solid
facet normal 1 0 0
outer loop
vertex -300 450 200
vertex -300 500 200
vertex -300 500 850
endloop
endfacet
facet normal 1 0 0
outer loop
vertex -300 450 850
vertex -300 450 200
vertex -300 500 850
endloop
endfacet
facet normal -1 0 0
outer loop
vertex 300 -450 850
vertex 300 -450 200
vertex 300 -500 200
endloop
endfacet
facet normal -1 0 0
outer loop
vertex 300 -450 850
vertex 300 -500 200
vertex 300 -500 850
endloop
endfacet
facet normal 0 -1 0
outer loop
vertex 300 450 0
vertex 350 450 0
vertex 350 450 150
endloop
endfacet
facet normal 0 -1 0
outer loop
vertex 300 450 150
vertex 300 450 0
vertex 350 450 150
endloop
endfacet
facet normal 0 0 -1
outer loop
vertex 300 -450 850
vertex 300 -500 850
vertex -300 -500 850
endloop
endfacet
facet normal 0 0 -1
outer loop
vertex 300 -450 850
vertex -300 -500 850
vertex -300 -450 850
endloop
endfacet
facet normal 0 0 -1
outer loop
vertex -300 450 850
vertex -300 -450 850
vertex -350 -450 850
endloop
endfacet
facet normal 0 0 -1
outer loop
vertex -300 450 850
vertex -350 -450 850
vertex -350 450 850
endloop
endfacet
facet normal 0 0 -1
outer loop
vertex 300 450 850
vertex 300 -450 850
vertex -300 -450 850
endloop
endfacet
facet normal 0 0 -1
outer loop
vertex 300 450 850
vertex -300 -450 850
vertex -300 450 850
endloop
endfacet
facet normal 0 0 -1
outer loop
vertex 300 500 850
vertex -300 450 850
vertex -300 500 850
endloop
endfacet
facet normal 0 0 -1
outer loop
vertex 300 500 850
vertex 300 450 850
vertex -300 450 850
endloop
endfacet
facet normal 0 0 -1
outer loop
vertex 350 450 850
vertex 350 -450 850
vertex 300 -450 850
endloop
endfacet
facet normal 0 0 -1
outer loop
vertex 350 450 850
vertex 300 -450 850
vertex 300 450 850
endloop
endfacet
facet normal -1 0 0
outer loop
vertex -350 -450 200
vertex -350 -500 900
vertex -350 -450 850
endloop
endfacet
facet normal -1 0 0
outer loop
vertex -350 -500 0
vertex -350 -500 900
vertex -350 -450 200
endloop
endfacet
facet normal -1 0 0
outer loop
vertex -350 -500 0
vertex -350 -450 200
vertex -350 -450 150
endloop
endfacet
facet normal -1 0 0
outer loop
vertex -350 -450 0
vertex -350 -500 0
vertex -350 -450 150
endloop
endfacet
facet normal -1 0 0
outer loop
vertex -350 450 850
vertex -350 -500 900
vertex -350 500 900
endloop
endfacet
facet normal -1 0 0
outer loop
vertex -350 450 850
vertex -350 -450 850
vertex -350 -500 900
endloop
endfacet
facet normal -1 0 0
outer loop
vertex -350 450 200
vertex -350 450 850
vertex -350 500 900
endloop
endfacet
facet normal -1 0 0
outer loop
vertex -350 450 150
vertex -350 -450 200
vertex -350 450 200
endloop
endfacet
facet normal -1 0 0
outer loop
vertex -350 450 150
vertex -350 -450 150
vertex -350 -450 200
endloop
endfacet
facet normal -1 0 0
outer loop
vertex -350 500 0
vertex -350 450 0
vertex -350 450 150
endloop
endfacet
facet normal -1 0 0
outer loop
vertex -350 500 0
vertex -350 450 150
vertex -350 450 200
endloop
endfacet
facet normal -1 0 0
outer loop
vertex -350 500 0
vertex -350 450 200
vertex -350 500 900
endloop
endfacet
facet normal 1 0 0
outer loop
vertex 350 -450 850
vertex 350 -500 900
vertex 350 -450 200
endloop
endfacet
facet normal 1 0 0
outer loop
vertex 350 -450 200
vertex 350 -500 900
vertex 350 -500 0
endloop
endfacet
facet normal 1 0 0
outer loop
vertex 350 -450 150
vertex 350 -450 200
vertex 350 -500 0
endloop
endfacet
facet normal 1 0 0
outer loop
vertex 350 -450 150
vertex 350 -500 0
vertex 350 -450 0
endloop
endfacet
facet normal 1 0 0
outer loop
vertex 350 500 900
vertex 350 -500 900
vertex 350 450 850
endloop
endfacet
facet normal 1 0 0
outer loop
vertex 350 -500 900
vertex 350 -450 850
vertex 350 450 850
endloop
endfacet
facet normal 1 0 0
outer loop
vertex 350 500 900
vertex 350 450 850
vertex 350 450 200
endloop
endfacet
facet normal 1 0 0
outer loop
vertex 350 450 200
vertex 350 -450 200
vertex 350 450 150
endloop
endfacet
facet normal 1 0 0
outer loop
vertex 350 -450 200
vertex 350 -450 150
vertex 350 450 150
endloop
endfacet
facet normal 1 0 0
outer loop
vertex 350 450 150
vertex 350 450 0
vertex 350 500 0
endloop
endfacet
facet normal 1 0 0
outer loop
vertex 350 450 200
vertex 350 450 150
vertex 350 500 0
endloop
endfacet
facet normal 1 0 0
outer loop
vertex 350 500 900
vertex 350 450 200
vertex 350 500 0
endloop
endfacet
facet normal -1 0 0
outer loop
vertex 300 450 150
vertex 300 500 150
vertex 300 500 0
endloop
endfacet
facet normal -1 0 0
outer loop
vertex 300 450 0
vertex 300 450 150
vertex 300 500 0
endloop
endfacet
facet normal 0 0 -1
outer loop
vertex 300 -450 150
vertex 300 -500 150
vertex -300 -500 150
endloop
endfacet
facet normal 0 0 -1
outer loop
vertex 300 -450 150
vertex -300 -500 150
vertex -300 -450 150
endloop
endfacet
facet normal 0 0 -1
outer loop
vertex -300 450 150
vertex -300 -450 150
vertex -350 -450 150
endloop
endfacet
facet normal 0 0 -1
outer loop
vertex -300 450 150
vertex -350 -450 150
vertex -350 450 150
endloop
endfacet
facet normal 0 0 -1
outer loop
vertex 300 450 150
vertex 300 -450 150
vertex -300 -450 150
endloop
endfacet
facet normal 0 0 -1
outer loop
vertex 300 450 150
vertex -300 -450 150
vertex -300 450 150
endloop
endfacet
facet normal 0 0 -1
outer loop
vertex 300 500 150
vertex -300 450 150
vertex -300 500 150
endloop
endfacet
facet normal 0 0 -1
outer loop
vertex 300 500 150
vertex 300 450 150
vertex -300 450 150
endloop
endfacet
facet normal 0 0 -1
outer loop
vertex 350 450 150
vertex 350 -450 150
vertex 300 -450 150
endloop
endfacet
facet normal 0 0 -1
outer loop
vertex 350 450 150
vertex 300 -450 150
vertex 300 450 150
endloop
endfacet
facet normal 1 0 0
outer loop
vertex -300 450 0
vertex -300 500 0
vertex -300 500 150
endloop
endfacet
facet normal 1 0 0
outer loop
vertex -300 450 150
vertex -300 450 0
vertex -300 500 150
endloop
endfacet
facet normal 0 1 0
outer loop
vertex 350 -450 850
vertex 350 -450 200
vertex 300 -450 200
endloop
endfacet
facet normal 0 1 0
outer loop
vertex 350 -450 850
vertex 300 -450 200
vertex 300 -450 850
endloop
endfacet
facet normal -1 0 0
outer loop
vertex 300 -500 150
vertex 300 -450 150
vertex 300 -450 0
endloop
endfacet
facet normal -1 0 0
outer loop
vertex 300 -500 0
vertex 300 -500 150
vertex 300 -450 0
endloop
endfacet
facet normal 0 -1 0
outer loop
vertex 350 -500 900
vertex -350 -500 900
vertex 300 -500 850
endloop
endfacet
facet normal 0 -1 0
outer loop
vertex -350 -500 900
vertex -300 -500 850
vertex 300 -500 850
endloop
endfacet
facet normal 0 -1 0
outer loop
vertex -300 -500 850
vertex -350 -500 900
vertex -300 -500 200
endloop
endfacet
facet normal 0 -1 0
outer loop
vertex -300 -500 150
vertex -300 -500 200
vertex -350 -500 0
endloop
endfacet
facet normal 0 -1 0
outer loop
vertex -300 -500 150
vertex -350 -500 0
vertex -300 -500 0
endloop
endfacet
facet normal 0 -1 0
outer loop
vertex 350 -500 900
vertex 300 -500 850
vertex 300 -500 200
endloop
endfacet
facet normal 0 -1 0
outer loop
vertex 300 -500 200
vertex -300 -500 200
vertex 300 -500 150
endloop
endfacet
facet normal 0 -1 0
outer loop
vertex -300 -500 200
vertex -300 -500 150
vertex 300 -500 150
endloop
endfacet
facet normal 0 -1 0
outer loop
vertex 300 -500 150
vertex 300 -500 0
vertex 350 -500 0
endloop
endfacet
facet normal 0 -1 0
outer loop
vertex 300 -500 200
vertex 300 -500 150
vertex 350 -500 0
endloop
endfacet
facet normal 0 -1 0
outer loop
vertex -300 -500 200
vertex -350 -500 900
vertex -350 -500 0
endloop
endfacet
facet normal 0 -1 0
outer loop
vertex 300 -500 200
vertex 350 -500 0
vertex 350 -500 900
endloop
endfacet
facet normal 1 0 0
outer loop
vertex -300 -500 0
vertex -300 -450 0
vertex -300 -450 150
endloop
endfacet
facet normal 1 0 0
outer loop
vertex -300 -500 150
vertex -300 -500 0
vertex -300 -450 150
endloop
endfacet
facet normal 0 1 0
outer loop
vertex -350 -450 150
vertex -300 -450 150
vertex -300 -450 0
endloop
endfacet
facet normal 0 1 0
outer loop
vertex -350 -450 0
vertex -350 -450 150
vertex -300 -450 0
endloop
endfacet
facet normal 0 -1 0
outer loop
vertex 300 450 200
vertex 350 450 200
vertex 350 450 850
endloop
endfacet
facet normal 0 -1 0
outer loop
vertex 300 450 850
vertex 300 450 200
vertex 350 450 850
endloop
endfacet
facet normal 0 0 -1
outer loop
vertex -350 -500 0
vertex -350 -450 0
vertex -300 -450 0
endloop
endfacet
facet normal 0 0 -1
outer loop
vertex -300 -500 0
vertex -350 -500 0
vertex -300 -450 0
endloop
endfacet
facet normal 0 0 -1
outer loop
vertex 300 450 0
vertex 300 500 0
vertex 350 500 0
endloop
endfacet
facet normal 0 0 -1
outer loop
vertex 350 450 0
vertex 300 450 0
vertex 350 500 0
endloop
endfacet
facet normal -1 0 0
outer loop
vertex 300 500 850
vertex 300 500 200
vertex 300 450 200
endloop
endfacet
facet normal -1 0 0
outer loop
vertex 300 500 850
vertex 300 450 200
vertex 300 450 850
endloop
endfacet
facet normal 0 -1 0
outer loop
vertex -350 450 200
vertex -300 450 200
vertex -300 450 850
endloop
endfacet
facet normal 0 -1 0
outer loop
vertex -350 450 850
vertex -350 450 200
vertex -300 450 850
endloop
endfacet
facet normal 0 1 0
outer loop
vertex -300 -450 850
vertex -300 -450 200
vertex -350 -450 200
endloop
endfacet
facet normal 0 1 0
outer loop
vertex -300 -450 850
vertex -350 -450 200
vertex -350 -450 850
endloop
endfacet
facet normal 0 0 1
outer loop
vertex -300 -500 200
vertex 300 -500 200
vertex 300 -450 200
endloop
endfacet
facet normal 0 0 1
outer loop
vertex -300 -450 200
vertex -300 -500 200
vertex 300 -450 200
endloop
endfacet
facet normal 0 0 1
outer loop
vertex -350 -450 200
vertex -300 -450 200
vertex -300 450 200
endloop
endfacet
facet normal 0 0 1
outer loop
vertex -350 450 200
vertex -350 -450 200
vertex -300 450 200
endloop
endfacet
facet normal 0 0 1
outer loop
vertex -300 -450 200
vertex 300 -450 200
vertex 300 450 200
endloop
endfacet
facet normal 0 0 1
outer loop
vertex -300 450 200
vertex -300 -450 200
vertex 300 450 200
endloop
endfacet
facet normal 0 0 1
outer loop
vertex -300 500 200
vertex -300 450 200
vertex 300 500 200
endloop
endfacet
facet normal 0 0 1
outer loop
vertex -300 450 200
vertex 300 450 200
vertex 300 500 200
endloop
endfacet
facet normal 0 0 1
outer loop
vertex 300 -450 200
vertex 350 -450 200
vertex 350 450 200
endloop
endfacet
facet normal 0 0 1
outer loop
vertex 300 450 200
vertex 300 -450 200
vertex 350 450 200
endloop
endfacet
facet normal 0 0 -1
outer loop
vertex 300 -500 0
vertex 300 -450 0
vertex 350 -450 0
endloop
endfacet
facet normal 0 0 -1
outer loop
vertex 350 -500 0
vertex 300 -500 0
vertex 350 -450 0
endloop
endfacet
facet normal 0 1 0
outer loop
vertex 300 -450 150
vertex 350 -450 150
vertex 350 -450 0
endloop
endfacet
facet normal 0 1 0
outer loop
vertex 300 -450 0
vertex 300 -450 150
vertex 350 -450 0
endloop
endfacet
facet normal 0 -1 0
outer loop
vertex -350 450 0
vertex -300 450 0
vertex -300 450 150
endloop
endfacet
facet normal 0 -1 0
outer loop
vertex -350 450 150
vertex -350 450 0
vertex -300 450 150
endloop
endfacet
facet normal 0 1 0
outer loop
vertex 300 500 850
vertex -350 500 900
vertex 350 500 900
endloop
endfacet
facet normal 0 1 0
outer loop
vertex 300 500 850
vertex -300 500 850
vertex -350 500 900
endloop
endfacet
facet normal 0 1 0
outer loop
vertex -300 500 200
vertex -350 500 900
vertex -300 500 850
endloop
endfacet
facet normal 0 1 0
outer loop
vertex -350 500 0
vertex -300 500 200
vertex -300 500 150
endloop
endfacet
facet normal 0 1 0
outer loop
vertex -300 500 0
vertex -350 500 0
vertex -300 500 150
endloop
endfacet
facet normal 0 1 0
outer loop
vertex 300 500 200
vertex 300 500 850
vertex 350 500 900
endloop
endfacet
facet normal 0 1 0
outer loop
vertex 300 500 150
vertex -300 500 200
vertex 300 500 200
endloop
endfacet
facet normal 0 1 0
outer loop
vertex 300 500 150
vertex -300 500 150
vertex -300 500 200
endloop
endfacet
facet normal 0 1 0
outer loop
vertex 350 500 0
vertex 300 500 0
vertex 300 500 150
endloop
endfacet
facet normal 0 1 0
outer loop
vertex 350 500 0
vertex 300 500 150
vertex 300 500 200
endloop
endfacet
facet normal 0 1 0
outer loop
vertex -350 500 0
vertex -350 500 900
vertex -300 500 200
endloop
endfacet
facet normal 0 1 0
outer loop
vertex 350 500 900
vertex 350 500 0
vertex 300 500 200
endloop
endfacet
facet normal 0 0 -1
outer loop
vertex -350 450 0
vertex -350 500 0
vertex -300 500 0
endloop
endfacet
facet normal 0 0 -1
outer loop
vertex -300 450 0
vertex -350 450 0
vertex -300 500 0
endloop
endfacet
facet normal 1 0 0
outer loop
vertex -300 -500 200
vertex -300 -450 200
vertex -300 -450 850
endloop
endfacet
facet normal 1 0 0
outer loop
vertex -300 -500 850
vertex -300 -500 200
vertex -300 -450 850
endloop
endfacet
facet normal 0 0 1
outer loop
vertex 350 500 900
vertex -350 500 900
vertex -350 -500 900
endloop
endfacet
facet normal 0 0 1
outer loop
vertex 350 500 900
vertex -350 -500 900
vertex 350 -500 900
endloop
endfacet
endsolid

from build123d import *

# Parameters (mm, degrees)
F0_W     = 700
F0_H     = 1000
F1_DEPTH = 900
F2_W     = 900
F2_H     = 97.384112
F2_H_2   = 150
F2_H_3   = 650
F3_DEPTH = 1000
F4_W     = 600
F4_H     = 174.410781
F4_H_2   = 150
F4_H_3   = 650
F5_DEPTH = 1000


with BuildPart() as f1:
    # F0 (on Top) → F1 (new body)
    with BuildSketch(Plane.XY):
        Rectangle(F0_W, F0_H)
    extrude(amount=F1_DEPTH)

    # F2 (on face) → F3 (cut)
    with BuildSketch(Plane.YZ.offset(350)):
        with Locations((0, -48.692056)):
            Rectangle(F2_W, F2_H)
        with Locations((0, 75)):
            Rectangle(F2_W, F2_H_2)
        with Locations((0, 525)):
            Rectangle(F2_W, F2_H_3)
    extrude(amount=-F3_DEPTH, mode=Mode.SUBTRACT)

    # F4 (on face) → F5 (cut)
    with BuildSketch(Plane(origin=(0, 500, 0), x_dir=(-1, 0, 0), z_dir=(0, 1, 0))):
        with Locations((0, -87.20539)):
            Rectangle(F4_W, F4_H)
        with Locations((0, 75)):
            Rectangle(F4_W, F4_H_2)
        with Locations((0, 525)):
            Rectangle(F4_W, F4_H_3)
    extrude(amount=-F5_DEPTH, mode=Mode.SUBTRACT)


solid = f1.part
